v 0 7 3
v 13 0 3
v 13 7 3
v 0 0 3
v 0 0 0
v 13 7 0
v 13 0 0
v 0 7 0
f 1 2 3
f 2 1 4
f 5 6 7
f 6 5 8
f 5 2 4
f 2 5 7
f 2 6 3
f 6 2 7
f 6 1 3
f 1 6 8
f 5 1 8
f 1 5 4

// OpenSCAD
// Generated by SolidPython 1.0.1 on 2020-07-29 00:46:55


cube(size = [13, 7, 3]);
/***********************************************
*********      SolidPython code:      **********
************************************************
 
# import packages: SolidPython
from solid import *
from solid.utils import *
from itertools import chain, combinations, permutations


class Resize:

    def __init__(self, scad_file):
        self.scad_file = scad_file
        #self.scad_file = import_scad(scad_file)
        # cone/cylinder param:
        self.r1 = 0
        self.r2 = 0
        self.h = 0
        # rectangular prism param:
        self.w = 0
        self.l = 0
        # ellipse param:
        self.r = 0

    # import OpenScad code (file name corresponds to shape)


    # classify shape + parameters
    def assign(self, param1, param2, param3):
        if self.scad_file == 'cone.scad':
            self.r1 = param1
            self.r2 = param2
            self.h = param3
        elif self.scad_file == 'cylinder.scad':
            self.r1 = param1
            self.r2 = param2
            self.h = param3
        elif self.scad_file == 'rectangularPrism.scad':
            self.h = param1
            self.l = param2
            self.w = param3
        else:
            self.r = param1
            self.h = param2

    # resize parameters
    def iterate(self):
        x = range(3, 20, 2)
        i = 1
        if self.scad_file == 'cone.scad':
            tempList = list(permutations(x, 2))
            for temp in tempList:
                param1 = temp[0]
                param2 = temp[1]
                filepath = 'produced_scad_files/' + 'cone' + str(param1) + '_' + str(param2) + '_' + '.scad'
                scad_render_to_file(cylinder(h=param1, r1=param2, r2=0), filepath)

        elif self.scad_file == 'cylinder.scad':
            tempList = list(permutations(x, 3))
            for temp in tempList:
                param1 = temp[0]
                param2 = temp[1]
                filepath = 'produced_scad_files/' + 'cylinder' + str(param1) + '_' + str(param2) + '_' + '.scad'
                scad_render_to_file(cylinder(h=param1, r1=param2, r2=param2), filepath)

        elif self.scad_file == 'rectangularPrism.scad':
            tempList = list(permutations(x, 3))
            for temp in tempList:
                param1 = temp[0]
                param2 = temp[1]
                param3 = temp[2]
                filepath = 'produced_scad_files/' + 'rectangularPrism' + str(param1) + '_' + str(param2) + '_' + str(
                    param3) + '.scad'
                scad_render_to_file(cube(size=(param1, param2, param3)), filepath)

        elif self.scad_file == 'ellipse.scad':
            tempList = list(permutations(x, 4))
            for temp in tempList:
                param1 = temp[0]
                param2 = temp[1]
                param3 = temp[2]
                param4 = temp[3]
                filepath = 'produced_scad_files/' + 'ellipse' + str(param1) + '_' + str(param2) + '_' + str(param3) + '_' + str(param4) + '.scad'
                scad_render_to_file(scale([param1, param2, param3])(sphere(r=param4)), filepath)

    def render_to_scadfile(self):
        scad_render_to_file(scad, 'example.scad') 
 
************************************************/
